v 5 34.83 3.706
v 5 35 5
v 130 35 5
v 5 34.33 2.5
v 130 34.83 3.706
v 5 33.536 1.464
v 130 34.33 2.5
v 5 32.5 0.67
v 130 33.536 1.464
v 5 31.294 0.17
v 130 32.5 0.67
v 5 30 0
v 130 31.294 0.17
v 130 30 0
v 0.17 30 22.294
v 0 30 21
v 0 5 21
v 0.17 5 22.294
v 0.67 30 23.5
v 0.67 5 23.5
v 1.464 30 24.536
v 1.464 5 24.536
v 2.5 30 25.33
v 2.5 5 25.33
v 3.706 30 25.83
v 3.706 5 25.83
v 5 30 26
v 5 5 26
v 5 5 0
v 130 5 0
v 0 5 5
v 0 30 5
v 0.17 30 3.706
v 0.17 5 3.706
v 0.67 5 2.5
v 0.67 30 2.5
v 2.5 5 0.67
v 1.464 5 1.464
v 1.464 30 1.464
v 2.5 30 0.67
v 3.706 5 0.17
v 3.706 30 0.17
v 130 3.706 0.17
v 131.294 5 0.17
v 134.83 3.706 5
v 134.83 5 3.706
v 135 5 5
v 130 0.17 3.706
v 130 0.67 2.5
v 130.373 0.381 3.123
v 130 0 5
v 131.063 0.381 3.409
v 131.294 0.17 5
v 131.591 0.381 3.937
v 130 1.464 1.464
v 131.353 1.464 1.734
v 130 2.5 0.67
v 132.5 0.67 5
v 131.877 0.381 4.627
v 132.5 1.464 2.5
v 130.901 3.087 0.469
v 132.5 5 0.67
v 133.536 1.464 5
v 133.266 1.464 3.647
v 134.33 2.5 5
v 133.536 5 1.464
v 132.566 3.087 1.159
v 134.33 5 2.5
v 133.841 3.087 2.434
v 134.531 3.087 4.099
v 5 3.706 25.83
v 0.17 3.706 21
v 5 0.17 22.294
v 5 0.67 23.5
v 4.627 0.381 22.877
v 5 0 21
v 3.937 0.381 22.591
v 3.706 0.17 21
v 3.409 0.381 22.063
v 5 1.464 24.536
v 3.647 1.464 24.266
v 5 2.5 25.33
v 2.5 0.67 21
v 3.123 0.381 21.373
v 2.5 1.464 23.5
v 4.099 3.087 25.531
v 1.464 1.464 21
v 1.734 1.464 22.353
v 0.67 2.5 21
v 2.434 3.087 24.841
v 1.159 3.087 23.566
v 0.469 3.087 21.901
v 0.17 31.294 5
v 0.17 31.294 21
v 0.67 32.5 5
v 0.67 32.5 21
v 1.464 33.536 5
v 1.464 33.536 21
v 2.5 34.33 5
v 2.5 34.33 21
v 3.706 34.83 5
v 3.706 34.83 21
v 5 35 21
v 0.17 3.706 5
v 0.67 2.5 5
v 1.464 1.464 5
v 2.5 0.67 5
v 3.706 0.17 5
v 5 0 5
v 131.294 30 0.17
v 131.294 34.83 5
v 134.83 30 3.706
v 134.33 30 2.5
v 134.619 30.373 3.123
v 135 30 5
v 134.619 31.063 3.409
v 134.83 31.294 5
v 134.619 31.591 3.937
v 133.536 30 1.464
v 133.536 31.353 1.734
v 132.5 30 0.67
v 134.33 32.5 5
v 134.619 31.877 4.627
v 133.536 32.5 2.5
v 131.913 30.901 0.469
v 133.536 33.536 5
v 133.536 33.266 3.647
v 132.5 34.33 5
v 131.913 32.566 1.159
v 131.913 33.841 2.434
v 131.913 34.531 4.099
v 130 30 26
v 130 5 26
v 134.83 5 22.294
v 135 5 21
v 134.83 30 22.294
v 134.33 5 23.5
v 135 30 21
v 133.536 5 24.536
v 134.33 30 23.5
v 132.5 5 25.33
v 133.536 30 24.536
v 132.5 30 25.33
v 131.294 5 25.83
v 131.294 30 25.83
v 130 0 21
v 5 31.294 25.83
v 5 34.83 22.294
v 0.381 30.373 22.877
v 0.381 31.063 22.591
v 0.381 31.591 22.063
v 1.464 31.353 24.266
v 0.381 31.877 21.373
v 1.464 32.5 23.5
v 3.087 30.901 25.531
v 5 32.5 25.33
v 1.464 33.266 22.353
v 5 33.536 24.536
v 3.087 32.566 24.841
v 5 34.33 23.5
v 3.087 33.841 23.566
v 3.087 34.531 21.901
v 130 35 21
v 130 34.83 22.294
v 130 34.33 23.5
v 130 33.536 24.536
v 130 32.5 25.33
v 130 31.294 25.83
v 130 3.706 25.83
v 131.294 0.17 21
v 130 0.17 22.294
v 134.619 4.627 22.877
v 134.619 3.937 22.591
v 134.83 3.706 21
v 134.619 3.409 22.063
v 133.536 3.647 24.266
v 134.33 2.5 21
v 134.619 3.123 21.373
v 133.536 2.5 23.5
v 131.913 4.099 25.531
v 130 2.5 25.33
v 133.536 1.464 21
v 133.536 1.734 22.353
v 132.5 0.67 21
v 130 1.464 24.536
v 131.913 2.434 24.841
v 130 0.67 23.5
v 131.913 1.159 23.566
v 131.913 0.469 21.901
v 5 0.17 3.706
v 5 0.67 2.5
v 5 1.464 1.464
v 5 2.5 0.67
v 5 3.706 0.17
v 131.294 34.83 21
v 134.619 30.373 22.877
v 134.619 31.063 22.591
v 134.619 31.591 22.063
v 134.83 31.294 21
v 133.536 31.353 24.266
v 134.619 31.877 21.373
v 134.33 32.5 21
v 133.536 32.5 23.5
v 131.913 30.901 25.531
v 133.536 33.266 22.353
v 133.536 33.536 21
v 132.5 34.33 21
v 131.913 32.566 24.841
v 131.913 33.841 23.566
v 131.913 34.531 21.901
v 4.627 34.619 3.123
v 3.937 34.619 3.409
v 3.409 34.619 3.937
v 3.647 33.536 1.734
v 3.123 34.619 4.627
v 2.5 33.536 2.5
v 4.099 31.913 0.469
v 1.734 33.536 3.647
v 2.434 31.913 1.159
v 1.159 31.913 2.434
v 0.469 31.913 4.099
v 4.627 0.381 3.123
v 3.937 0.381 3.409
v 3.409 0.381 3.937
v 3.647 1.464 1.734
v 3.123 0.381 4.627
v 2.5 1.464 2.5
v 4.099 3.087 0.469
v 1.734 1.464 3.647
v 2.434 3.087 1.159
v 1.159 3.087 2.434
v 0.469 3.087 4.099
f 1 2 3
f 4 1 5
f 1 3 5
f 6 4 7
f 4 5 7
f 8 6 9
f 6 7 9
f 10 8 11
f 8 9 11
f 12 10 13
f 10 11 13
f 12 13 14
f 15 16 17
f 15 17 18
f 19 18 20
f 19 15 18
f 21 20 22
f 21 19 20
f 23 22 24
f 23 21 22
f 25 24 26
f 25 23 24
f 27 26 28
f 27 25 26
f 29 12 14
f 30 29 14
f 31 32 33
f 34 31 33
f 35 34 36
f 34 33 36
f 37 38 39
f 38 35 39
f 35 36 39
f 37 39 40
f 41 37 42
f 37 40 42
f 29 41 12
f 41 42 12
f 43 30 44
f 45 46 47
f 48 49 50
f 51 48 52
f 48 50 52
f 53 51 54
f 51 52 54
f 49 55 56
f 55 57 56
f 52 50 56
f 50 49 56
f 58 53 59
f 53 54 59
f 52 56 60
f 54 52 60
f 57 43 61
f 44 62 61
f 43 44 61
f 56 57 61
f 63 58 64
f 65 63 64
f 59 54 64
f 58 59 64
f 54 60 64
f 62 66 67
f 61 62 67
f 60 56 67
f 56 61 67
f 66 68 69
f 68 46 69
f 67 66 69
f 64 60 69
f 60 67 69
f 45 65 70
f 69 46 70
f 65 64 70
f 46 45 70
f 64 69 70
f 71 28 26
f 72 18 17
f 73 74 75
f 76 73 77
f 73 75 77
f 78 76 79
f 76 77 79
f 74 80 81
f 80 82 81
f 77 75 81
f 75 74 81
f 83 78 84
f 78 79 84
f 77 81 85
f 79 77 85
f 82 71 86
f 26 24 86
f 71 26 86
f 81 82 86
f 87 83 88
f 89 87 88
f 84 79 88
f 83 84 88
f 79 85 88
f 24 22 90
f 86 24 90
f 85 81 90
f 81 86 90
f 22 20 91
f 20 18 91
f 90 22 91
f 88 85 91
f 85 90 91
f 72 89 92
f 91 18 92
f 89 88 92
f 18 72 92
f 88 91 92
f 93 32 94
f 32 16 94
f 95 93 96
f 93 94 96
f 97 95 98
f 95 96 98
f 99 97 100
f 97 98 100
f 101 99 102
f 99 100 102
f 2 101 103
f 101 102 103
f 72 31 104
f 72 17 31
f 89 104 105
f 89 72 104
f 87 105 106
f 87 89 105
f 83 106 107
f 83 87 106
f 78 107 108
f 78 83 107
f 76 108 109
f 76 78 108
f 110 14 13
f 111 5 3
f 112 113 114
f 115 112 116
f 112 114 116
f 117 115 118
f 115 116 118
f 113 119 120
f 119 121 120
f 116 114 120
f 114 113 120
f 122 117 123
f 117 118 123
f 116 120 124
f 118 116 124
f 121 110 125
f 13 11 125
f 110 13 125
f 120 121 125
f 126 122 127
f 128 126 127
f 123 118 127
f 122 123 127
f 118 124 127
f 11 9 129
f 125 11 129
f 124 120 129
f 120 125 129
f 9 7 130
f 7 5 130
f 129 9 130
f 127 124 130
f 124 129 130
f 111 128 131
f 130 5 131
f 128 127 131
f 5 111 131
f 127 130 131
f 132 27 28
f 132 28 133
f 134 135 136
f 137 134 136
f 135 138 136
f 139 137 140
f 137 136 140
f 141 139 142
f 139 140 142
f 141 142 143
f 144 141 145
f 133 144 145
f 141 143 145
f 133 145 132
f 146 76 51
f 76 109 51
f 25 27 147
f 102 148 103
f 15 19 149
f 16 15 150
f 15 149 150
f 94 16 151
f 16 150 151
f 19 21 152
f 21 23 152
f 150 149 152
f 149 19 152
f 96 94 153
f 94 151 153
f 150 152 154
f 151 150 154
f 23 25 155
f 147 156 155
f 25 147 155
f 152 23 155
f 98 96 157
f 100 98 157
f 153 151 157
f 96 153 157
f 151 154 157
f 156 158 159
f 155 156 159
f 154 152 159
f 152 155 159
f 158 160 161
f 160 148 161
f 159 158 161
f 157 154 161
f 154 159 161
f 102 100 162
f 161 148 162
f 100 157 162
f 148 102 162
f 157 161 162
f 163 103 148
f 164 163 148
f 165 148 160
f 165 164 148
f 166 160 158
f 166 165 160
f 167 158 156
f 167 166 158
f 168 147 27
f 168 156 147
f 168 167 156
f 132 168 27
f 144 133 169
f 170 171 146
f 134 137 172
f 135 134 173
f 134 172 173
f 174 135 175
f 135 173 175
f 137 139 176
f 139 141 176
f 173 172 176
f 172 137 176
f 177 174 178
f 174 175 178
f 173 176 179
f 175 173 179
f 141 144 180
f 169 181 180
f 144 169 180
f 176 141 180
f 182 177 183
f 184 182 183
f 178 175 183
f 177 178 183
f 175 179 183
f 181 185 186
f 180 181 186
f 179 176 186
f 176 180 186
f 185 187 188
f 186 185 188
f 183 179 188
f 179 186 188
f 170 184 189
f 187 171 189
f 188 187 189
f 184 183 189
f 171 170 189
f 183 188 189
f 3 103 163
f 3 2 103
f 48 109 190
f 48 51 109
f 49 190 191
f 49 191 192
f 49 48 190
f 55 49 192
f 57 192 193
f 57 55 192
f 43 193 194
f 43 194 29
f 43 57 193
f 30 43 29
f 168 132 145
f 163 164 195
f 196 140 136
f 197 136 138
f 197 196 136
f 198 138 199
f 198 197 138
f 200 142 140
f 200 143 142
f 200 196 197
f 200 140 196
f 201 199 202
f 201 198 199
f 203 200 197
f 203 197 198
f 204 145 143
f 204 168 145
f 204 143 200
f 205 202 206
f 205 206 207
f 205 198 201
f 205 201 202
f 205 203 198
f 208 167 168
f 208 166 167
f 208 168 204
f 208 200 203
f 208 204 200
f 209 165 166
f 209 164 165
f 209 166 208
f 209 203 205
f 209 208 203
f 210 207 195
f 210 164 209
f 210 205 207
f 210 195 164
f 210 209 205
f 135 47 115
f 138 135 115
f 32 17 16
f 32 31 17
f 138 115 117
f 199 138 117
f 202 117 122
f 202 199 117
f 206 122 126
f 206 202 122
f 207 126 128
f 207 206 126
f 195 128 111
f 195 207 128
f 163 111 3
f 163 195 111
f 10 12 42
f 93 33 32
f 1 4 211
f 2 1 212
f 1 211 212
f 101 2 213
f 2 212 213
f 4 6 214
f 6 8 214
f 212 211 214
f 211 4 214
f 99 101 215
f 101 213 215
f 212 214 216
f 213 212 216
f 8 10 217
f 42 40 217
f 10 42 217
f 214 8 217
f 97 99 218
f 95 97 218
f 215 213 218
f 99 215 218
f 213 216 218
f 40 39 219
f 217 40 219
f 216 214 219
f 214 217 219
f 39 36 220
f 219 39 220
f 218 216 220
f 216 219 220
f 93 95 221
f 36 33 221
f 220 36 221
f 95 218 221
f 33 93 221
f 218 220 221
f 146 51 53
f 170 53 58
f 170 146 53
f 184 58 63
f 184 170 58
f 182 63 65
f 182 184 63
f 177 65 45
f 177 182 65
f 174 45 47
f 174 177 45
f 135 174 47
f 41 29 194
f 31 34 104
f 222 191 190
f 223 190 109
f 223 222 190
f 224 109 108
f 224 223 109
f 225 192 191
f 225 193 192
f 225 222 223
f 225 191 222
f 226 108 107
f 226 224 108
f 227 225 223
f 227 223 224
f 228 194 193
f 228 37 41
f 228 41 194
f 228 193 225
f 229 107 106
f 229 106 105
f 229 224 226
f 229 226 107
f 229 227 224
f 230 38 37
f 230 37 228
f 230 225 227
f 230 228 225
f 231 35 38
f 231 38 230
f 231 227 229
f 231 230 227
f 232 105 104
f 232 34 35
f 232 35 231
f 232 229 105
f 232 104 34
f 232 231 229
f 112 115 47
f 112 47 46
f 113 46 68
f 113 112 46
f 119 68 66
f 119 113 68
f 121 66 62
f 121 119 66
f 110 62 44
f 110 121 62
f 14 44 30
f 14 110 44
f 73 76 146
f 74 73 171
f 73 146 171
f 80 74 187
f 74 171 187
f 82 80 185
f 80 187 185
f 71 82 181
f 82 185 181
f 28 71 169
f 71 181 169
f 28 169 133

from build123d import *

# Parameters (mm, degrees)
SKETCH1_W           = 135
SKETCH1_H           = 35
BOSS_EXTRUDE1_DEPTH = 26
FILLET1_R           = 5


with BuildPart() as part:
    # Sketch1 → Boss-Extrude1 (new body)
    with BuildSketch(Plane.XY):
        with Locations((67.5, 17.5)):
            Rectangle(SKETCH1_W, SKETCH1_H)
    extrude(amount=BOSS_EXTRUDE1_DEPTH)

    # Fillet1
    fillet1_edges = [part.edges().sort_by_distance(p)[0] for p in [
        (67.5, 35, 26),
        (0, 17.5, 26),
        (67.5, 0, 26),
        (0, 17.5, 0),
        (67.5, 35, 0),
        (135, 17.5, 0),
        (67.5, 0, 0),
        (135, 17.5, 26),
        (0, 0, 13),
        (0, 35, 13),
        (135, 35, 13),
        (135, 0, 13),
    ]]
    fillet(fillet1_edges, radius=FILLET1_R)


solid = part.part
